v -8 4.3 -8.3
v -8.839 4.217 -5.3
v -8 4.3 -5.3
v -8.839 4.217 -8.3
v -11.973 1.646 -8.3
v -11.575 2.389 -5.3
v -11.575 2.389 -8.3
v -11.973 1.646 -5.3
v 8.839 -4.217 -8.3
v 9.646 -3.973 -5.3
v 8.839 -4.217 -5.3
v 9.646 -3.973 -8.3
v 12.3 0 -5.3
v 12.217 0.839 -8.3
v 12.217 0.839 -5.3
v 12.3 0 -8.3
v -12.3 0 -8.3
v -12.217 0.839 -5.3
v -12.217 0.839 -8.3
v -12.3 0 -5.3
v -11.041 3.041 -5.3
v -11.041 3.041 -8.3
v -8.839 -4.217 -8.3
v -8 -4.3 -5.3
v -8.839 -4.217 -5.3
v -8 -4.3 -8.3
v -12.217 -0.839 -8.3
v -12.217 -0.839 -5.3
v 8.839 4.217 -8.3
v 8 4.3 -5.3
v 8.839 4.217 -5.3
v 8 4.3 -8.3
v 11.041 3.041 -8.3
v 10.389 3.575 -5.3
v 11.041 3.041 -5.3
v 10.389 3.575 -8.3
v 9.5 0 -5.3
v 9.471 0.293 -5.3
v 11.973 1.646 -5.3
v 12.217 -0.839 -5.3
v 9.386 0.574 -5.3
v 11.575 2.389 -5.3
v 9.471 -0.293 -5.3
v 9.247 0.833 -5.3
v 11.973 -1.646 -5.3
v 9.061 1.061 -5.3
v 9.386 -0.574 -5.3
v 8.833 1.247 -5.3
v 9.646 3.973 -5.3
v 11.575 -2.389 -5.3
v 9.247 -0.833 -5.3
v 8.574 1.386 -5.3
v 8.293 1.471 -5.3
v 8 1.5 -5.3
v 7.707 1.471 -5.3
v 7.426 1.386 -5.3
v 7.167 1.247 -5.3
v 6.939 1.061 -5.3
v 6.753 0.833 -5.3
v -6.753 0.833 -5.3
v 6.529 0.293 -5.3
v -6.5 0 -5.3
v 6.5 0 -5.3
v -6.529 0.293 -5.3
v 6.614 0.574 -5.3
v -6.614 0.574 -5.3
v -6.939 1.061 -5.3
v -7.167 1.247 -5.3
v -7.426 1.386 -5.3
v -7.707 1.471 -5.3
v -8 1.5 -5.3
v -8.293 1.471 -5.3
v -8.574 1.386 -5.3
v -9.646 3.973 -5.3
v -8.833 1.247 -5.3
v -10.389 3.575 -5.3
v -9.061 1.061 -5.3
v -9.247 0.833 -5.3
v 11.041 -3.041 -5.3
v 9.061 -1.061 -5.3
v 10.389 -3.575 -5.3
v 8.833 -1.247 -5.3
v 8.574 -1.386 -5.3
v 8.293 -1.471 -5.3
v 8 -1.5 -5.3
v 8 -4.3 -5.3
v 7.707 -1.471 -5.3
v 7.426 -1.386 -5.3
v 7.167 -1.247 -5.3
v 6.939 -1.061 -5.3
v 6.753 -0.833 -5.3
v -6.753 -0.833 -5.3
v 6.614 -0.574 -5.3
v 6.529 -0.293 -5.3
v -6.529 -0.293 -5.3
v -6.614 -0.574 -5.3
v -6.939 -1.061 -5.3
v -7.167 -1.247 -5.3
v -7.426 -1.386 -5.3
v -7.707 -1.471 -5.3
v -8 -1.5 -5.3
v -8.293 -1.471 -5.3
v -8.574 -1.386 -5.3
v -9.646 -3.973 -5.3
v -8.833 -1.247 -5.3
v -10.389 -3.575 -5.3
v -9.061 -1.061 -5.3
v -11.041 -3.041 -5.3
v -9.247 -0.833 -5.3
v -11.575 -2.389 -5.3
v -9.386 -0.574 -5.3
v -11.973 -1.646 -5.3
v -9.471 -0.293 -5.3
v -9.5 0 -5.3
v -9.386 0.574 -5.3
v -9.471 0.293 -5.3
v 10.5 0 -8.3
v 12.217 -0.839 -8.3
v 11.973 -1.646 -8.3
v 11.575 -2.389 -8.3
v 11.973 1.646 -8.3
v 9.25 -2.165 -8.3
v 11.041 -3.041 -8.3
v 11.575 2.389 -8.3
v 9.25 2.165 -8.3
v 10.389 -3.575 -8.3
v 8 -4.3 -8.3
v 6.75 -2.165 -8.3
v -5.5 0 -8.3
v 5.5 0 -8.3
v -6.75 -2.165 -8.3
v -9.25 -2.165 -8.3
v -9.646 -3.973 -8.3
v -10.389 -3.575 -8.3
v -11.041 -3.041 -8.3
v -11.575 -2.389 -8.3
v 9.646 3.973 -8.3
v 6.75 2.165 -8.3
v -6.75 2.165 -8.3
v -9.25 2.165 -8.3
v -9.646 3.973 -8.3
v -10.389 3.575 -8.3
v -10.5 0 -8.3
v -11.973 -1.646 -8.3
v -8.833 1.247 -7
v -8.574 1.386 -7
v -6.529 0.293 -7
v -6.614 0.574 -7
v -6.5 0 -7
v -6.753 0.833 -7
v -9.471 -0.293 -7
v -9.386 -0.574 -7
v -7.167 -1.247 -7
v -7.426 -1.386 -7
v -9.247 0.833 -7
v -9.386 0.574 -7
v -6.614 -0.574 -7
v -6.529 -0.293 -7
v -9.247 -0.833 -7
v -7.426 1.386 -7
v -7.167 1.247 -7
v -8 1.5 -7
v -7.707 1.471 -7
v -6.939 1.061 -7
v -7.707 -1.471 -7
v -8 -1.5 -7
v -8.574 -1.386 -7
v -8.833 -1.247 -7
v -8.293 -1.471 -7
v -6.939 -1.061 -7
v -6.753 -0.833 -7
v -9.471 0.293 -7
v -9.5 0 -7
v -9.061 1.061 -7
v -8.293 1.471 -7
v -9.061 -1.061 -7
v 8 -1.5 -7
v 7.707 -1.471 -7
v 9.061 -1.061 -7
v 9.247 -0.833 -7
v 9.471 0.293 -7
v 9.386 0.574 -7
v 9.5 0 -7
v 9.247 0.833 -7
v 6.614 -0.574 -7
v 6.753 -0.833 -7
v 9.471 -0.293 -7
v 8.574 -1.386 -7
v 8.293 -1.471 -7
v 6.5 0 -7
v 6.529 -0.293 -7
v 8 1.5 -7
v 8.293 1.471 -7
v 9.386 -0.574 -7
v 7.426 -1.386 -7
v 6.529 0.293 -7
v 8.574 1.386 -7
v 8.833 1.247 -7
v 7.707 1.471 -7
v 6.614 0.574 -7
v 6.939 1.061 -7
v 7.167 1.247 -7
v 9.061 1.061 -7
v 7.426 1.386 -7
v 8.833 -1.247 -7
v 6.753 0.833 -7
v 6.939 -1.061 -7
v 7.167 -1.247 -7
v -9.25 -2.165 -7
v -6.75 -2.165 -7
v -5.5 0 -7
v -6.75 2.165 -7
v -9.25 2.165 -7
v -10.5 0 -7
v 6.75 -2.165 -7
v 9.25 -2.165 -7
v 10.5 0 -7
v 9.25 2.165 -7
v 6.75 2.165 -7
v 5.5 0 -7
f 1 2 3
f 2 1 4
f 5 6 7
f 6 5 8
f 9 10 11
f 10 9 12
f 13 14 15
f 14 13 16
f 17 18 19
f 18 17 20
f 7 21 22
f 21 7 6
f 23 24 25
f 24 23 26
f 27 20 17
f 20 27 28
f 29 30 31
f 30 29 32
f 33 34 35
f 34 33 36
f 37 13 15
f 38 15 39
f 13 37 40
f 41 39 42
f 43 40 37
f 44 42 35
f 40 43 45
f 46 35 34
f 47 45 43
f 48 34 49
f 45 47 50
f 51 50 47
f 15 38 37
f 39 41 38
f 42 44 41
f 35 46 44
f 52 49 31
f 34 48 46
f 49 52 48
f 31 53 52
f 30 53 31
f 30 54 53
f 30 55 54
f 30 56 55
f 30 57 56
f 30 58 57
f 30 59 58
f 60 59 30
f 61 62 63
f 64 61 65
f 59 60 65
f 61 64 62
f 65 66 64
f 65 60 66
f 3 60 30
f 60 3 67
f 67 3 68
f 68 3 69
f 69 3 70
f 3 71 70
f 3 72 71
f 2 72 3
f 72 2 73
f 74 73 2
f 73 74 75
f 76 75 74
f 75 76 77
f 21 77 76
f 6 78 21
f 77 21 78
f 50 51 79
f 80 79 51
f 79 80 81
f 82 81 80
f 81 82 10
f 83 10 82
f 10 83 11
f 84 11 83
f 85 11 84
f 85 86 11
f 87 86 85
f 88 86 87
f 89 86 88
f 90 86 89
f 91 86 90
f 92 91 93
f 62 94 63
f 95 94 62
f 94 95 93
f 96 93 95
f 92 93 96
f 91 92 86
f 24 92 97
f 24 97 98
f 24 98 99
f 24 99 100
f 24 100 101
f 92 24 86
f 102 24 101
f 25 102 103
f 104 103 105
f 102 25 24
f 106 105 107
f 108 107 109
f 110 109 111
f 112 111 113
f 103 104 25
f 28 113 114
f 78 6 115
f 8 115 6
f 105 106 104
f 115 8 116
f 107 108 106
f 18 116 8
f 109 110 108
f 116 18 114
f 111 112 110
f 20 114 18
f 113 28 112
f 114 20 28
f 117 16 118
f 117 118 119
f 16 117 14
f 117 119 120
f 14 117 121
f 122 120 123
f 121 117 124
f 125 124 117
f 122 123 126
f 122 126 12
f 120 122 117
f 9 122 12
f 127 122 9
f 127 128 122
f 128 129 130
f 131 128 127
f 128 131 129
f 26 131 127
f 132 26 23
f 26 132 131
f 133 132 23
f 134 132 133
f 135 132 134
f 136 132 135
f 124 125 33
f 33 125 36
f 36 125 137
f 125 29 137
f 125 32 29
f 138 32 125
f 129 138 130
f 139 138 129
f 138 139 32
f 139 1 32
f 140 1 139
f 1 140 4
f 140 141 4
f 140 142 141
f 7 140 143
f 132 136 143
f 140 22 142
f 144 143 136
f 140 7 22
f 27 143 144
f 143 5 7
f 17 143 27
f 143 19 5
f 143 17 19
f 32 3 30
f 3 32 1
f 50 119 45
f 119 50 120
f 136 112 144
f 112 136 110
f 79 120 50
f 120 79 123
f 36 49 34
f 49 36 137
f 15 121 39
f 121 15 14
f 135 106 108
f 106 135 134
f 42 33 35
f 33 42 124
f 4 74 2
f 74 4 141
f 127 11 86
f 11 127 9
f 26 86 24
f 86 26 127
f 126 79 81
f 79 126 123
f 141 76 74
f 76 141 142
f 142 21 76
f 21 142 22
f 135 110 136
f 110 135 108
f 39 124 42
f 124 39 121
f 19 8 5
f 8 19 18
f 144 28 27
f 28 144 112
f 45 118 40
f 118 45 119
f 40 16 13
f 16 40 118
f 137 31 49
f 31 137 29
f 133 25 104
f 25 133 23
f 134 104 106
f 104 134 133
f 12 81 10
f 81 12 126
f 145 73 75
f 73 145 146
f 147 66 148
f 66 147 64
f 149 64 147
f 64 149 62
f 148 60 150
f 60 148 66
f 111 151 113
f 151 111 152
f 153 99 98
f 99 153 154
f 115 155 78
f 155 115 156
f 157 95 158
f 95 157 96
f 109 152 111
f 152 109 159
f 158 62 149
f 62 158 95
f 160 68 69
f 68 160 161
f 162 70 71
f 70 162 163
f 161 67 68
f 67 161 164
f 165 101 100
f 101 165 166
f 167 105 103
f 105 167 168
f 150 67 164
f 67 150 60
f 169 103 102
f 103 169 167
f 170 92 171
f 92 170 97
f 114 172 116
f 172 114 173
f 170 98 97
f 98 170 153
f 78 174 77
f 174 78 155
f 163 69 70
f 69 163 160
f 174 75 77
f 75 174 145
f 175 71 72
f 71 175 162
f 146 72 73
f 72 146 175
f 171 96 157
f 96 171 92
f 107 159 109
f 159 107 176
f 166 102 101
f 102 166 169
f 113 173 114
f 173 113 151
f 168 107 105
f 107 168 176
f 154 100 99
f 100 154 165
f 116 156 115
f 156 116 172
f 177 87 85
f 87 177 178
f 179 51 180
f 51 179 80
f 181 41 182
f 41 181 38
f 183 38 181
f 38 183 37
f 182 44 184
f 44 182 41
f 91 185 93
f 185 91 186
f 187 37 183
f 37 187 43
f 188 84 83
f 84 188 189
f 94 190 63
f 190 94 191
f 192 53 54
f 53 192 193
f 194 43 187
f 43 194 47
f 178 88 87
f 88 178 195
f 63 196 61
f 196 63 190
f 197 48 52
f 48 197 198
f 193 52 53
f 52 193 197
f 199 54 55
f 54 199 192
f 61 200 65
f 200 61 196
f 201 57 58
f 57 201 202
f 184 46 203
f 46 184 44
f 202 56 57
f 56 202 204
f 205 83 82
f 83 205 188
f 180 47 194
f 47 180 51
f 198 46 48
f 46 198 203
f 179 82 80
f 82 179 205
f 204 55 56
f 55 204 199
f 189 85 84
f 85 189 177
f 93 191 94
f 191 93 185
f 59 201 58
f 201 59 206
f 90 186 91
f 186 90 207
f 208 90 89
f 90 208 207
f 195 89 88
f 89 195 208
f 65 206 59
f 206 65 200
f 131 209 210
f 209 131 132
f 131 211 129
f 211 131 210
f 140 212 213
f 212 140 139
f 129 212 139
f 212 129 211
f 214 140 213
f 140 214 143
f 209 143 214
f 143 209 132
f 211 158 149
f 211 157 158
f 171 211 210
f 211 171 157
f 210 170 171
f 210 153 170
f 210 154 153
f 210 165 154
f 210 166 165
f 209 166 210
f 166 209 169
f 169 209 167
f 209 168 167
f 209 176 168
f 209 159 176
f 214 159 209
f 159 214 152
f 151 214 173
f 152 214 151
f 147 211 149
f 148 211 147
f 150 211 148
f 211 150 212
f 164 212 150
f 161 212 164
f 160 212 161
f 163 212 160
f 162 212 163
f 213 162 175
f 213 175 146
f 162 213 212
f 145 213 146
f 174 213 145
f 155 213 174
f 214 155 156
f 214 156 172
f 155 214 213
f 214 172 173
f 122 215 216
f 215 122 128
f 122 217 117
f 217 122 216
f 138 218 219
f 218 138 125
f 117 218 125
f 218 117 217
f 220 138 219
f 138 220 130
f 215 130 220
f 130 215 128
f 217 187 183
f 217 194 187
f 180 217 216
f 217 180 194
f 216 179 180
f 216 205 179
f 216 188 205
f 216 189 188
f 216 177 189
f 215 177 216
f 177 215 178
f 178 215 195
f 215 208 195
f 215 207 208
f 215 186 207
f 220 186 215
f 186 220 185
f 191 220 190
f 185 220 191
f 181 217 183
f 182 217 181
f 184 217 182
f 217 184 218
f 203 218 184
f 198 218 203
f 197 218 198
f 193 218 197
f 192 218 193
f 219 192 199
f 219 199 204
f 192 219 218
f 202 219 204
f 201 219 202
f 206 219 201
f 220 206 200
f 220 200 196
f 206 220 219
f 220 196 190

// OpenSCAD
/*
difference() {
    union() {
        cylinder(d=5+0.6+3, h=5+0.6+4, $fn=32, center=true);
        translate([0,0,-4+0.2])
        hull() {
            translate([-8,0,0])
                cylinder(d=5+0.6+3, h=2, $fn=32, center=true);
            translate([8,0,0])
                cylinder(d=5+0.6+3, h=2, $fn=32, center=true);
        }
    }
    translate([0,0,-1])
        cylinder(d=5+0.6, h=5+0.6+2+0.01, $fn=32, center=true);
    
    translate([-8,0,0])
        cylinder(d=3, h=10, $fn=32, center=true);
    translate([8,0,0])
        cylinder(d=3, h=10, $fn=32, center=true);
    
}
*/
translate([0,0,-1])
difference() {
    translate([0,0,-6+0.2])
        hull() {
            translate([-8,0,0])
                cylinder(d=5+0.6+3, h=3, $fn=32, center=true);
            translate([8,0,0])
                cylinder(d=5+0.6+3, h=3, $fn=32, center=true);
        }

    translate([-8,0,0])
        cylinder(d=3, h=20, $fn=32, center=true);
    translate([8,0,0])
        cylinder(d=3, h=20, $fn=32, center=true);

    translate([-8,0,-7])
        cylinder(d=5, h=2, $fn=6, center=true);
    translate([8,0,-7])
        cylinder(d=5, h=2, $fn=6, center=true);

}
